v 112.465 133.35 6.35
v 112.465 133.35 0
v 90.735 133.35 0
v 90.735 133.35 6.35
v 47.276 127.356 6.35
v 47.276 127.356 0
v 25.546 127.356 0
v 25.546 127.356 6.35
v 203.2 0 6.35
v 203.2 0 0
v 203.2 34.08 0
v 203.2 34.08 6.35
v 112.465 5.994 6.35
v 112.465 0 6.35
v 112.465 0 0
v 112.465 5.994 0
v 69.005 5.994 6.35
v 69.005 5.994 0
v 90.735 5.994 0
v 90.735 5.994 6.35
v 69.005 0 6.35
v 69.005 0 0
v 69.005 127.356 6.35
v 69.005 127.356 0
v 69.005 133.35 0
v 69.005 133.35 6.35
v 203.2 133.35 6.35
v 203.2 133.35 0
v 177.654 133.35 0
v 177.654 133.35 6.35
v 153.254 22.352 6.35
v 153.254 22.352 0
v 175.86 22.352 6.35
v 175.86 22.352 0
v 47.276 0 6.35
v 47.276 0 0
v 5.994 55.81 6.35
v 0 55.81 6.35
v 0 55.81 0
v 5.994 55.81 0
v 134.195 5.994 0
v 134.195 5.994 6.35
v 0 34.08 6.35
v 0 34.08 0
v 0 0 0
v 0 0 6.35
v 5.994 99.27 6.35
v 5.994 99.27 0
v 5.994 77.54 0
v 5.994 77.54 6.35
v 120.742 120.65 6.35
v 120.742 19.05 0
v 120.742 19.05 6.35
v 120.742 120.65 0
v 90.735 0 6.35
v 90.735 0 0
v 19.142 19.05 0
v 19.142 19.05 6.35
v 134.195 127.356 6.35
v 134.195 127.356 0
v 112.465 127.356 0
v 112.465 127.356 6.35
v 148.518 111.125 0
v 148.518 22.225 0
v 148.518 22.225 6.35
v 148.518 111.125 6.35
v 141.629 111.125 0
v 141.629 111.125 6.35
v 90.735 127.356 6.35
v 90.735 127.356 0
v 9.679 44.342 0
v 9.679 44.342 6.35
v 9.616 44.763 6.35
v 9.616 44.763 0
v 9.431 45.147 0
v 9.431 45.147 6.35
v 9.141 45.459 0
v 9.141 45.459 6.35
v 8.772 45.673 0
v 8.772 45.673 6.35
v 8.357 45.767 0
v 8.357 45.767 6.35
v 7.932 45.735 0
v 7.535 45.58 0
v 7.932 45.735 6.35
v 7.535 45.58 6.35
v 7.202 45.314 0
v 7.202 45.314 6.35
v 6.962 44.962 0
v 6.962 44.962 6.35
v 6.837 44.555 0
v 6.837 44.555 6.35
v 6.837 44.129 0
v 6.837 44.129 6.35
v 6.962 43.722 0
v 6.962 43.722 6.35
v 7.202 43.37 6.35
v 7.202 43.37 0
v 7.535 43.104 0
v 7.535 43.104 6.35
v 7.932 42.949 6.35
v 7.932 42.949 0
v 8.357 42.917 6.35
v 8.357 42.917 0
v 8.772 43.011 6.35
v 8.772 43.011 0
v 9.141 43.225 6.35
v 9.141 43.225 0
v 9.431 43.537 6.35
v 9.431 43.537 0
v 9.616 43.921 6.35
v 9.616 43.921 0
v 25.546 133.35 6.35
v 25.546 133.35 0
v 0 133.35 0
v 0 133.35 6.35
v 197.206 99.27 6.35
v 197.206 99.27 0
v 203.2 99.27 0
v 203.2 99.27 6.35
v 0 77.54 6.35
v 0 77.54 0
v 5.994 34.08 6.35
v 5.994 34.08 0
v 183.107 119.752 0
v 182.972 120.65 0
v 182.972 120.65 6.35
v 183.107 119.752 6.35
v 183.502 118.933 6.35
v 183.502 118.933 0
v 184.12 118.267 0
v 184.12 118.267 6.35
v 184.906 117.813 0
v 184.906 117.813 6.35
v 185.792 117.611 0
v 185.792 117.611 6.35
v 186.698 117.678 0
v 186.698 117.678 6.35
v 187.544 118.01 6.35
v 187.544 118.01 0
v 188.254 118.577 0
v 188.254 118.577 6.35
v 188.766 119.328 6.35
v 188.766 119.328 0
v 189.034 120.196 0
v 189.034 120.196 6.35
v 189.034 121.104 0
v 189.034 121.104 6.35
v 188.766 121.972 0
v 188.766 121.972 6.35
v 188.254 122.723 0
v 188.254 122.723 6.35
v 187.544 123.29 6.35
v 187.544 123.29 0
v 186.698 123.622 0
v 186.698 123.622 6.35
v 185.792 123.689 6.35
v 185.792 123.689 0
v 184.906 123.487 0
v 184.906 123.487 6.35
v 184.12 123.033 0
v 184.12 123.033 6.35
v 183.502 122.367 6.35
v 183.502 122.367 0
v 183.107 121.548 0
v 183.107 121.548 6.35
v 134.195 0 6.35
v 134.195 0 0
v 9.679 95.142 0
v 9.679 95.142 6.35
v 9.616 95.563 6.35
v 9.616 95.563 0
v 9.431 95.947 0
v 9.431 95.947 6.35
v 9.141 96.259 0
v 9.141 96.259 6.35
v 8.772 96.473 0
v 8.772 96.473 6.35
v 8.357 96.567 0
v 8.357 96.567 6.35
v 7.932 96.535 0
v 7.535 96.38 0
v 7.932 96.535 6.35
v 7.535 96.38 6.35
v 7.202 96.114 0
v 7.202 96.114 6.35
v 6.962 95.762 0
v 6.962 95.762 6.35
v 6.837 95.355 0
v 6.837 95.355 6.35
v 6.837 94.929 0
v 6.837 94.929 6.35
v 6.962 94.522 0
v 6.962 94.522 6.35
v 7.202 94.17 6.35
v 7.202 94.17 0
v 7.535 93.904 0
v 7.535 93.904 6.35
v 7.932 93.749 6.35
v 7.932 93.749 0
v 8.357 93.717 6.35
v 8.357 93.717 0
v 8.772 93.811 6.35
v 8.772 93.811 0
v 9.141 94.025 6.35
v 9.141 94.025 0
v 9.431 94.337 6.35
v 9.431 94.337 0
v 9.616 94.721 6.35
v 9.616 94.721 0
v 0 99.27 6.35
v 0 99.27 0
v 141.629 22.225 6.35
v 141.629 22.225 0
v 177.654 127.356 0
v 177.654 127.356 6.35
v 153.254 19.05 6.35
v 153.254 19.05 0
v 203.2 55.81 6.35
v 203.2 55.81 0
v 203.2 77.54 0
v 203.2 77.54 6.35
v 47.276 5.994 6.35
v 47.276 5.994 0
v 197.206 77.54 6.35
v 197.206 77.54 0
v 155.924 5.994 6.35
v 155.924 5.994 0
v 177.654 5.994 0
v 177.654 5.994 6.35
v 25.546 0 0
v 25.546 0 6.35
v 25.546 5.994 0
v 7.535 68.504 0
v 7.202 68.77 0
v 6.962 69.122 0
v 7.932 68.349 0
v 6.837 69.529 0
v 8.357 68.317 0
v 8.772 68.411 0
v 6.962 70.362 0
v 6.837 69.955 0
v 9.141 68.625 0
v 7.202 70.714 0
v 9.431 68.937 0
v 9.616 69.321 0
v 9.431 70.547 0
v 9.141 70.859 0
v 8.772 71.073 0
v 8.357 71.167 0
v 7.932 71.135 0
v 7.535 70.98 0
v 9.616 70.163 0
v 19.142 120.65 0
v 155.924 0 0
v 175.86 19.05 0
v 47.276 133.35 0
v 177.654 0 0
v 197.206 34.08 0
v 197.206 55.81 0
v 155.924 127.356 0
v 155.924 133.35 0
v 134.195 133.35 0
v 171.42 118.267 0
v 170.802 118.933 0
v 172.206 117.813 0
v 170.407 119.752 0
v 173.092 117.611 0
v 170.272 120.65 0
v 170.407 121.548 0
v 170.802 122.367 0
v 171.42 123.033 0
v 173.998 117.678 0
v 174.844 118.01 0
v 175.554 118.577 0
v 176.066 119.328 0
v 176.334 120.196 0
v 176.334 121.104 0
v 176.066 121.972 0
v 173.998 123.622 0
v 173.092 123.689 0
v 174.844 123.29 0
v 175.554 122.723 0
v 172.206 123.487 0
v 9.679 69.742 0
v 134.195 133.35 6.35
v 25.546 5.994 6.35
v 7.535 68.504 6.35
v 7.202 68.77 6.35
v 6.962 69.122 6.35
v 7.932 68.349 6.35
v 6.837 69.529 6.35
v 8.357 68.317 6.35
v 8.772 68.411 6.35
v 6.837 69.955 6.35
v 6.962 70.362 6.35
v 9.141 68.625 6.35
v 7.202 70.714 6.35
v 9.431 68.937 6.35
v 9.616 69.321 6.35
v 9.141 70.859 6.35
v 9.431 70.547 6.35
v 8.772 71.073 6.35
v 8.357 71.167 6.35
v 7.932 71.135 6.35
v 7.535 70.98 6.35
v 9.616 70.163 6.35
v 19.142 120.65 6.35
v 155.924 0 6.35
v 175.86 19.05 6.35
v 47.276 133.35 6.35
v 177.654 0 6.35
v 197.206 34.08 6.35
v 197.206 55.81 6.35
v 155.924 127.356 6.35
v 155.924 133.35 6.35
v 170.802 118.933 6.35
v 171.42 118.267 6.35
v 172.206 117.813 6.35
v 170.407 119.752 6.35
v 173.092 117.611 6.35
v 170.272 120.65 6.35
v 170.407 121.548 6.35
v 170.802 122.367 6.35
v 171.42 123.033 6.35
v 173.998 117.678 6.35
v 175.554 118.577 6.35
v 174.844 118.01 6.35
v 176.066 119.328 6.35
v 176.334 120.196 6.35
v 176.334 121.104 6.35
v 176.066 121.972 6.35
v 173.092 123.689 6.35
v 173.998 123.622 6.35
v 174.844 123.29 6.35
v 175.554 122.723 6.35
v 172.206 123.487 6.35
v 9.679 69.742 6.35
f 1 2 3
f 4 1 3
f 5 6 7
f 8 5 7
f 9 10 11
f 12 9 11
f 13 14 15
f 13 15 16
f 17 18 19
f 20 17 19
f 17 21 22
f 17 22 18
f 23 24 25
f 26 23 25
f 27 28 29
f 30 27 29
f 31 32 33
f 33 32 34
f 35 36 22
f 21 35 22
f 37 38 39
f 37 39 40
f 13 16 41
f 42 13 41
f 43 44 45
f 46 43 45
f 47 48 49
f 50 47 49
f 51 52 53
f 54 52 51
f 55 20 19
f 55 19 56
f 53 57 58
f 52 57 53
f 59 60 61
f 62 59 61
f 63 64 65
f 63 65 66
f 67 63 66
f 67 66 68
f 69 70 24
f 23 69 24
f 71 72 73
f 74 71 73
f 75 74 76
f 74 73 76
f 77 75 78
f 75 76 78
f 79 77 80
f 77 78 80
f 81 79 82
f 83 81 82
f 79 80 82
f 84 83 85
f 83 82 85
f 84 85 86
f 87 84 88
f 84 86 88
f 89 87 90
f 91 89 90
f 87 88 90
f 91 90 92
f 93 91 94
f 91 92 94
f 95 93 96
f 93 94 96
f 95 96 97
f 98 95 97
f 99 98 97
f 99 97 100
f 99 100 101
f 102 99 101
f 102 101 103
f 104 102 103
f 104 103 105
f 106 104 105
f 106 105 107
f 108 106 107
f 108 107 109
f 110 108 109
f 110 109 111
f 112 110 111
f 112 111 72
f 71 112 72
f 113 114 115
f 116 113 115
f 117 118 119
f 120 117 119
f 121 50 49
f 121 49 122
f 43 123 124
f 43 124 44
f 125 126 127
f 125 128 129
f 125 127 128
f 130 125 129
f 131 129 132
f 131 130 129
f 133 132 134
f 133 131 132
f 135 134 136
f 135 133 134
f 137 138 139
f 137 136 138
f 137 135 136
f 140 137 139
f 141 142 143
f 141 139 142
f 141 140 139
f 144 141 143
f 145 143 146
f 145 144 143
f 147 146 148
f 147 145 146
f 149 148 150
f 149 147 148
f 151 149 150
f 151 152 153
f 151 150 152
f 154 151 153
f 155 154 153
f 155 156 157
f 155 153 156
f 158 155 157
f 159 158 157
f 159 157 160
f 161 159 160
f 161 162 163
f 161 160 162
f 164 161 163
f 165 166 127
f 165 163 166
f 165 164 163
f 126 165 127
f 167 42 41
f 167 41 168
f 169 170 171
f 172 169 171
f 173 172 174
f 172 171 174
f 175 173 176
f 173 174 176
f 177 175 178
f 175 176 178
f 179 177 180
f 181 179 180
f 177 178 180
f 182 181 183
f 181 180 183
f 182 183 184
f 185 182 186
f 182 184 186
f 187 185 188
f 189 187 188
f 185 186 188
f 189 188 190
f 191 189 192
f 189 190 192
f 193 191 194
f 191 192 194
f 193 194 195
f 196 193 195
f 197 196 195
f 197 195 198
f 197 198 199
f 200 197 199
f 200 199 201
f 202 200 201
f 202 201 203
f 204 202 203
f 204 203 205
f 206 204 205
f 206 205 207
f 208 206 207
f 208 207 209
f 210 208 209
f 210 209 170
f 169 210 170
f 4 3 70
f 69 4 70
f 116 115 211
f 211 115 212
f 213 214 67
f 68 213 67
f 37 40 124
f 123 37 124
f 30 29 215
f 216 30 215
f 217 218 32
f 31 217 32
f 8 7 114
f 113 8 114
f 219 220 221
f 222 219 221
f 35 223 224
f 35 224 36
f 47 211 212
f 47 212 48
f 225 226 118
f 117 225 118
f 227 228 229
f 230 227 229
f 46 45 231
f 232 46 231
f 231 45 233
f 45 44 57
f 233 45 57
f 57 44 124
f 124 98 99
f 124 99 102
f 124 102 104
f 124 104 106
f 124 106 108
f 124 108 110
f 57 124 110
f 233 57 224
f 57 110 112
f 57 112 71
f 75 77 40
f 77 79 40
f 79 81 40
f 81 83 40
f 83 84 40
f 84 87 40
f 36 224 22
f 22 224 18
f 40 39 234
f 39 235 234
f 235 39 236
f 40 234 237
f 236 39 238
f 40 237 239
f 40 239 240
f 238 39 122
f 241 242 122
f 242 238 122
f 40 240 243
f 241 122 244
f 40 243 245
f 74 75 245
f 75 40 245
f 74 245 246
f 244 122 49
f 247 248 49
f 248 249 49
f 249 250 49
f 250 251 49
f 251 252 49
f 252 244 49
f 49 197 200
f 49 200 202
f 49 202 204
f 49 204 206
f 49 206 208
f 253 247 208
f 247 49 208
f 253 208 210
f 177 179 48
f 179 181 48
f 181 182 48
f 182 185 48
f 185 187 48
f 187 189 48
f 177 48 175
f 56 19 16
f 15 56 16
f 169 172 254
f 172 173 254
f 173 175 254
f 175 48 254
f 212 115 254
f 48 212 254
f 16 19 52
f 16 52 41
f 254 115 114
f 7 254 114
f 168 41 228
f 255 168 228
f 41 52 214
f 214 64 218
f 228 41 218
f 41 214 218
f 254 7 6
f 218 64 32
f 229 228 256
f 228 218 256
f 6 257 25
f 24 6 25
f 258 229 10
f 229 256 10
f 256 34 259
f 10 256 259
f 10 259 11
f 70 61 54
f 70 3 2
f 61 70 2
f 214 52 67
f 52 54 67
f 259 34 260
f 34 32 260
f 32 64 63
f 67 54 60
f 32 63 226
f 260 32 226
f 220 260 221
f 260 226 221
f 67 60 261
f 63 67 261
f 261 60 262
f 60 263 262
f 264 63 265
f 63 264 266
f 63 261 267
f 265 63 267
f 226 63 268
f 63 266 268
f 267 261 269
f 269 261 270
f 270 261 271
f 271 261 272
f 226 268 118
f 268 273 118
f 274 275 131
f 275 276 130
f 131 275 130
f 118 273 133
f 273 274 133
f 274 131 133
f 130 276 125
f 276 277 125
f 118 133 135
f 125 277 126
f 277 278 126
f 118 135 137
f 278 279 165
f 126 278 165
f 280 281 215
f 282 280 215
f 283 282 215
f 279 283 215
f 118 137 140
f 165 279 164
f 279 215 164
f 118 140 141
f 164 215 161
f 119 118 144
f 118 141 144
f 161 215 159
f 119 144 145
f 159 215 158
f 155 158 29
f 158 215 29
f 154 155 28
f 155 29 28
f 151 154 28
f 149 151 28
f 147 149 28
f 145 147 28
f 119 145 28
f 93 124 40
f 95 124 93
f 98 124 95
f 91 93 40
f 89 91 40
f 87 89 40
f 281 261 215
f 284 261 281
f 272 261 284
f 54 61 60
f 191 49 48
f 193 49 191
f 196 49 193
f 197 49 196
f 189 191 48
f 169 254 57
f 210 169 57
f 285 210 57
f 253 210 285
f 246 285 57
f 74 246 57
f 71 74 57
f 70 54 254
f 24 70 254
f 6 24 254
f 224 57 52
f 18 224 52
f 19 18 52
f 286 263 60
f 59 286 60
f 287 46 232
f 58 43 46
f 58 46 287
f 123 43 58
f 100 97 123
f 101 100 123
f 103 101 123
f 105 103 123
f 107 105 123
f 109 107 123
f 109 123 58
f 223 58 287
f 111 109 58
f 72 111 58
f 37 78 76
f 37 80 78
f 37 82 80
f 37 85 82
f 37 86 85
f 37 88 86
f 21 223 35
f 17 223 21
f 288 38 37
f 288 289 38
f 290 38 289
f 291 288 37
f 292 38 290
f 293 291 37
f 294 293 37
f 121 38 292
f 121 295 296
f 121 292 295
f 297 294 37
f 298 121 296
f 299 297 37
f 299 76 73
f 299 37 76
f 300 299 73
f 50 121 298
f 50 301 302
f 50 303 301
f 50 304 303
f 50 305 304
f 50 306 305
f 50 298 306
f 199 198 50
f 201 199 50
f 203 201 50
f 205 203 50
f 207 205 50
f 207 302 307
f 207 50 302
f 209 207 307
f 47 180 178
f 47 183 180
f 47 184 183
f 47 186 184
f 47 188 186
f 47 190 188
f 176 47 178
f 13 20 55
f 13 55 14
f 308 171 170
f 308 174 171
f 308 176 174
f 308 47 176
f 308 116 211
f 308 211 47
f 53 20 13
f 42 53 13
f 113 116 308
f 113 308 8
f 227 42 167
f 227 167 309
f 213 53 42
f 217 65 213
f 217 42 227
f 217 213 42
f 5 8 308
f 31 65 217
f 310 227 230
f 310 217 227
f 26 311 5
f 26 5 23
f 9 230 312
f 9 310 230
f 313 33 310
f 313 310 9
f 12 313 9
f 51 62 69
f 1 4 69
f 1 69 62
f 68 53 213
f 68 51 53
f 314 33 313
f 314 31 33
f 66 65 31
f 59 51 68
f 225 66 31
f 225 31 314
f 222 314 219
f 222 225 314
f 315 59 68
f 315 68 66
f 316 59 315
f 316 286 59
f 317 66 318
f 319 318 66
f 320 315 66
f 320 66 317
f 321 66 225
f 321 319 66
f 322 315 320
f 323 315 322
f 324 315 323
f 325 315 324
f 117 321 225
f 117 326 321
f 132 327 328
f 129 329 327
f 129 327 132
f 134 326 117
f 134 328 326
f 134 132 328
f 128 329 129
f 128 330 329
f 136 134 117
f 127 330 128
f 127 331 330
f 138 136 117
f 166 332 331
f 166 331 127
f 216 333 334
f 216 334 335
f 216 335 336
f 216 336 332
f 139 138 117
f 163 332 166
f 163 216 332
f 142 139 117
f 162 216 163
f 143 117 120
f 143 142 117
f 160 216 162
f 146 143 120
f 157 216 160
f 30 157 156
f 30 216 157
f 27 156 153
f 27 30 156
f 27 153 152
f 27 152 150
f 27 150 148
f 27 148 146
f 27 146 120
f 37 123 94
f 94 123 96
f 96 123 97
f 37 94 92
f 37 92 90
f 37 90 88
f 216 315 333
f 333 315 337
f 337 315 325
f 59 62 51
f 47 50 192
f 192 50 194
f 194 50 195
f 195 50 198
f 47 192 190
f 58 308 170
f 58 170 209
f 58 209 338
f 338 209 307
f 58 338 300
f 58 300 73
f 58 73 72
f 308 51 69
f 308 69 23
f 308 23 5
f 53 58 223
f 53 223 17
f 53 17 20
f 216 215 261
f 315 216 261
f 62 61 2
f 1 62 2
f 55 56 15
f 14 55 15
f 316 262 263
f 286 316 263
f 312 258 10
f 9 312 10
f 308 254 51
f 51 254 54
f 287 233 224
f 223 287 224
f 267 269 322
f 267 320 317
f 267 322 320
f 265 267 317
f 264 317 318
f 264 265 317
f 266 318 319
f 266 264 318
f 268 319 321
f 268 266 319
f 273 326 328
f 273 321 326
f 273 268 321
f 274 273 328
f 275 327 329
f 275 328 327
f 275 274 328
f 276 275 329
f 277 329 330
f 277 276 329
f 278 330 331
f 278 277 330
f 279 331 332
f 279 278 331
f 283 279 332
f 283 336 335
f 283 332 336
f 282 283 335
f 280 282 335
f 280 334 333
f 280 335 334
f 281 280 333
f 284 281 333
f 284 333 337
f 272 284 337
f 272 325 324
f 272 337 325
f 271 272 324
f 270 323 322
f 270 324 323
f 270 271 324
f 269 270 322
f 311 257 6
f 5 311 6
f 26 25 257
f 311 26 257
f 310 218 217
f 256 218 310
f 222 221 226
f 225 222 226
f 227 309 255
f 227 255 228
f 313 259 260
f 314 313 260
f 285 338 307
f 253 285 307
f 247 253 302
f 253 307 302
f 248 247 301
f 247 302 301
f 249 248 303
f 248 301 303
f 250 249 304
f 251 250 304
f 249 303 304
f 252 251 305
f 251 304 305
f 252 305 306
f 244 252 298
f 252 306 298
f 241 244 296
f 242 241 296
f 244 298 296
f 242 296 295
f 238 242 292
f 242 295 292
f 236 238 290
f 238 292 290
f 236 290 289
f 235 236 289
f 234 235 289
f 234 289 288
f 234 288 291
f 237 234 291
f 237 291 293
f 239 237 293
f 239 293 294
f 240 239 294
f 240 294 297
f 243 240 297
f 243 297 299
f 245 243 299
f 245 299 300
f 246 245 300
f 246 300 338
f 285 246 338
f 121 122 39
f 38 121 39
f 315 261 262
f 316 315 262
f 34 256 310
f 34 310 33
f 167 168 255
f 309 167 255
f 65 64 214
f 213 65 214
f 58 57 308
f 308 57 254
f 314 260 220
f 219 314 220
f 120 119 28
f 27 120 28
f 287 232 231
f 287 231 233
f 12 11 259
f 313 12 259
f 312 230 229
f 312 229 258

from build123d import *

# Parameters (mm, degrees)
BOSS_EXTRUDE1_DEPTH     = 6.35
CUT_EXTRUDE1_DEPTH      = 244.131209432
CUT_EXTRUDE1_DEPTH_BACK = 244.131209432
SKETCH4_W               = 101.6
SKETCH4_H               = 101.6
SKETCH4_W_2             = 22.606
SKETCH4_H_2             = 3.302
SKETCH5_W               = 6.888524177
SKETCH5_H               = 88.9
CUT_EXTRUDE2_DEPTH      = 6.35
SKETCH6_R               = 1.429315601
CUT_EXTRUDE3_DEPTH      = 13.97


with BuildPart() as part:
    # Sketch3 → Boss-Extrude1 (new body)
    with BuildSketch(Plane.XY):
        Polygon((0, 77.53985), (0, 55.81015), (5.9944, 55.81015), (5.9944, 34.08045), (0, 34.08045), (0, 12.35075), (0, 0), (25.54605, 0), (25.54605, 5.9944), (47.27575, 5.9944), (47.27575, 0), (69.00545, 0), (69.00545, 5.9944), (90.73515, 5.9944), (90.73515, 0), (112.46485, 0), (112.46485, 5.9944), (134.19455, 5.9944), (134.19455, 0), (155.92425, 0), (155.92425, 5.9944), (177.65395, 5.9944), (177.65395, 0), (203.2, 0), (203.2, 34.08045), (197.2056, 34.08045), (197.2056, 55.81015), (203.2, 55.81015), (203.2, 77.53985), (197.2056, 77.53985), (197.2056, 99.26955), (203.2, 99.26955), (203.2, 120.99925), (203.2, 133.35), (177.65395, 133.35), (177.65395, 127.3556), (155.92425, 127.3556), (155.92425, 133.35), (134.19455, 133.35), (134.19455, 127.3556), (112.46485, 127.3556), (112.46485, 133.35), (90.73515, 133.35), (90.73515, 127.3556), (69.00545, 127.3556), (69.00545, 133.35), (47.27575, 133.35), (47.27575, 127.3556), (25.54605, 127.3556), (25.54605, 133.35), (0, 133.35), (0, 99.26955), (5.9944, 99.26955), (5.9944, 77.53985), align=None)
    extrude(amount=BOSS_EXTRUDE1_DEPTH)

    # Sketch4 → Cut-Extrude1 (cut, two sides: drawn at the far end of the back side and taken through both)
    with BuildSketch(Plane.XY.offset(6.35).offset(-CUT_EXTRUDE1_DEPTH_BACK)):
        with Locations((69.942028986, 69.85)):
            Rectangle(SKETCH4_W, SKETCH4_H)
        with BuildLine():
            ThreePointArc((189.068028986, 120.65), (186.020028986, 123.698), (182.972028986, 120.65))
            Line((182.972028986, 120.65), (189.068028986, 120.65))
        make_face()
        with BuildLine():
            Line((189.068028986, 120.65), (182.972028986, 120.65))
            ThreePointArc((182.972028986, 120.65), (186.020028986, 117.602), (189.068028986, 120.65))
        make_face()
        with BuildLine():
            ThreePointArc((176.368028986, 120.65), (173.320028986, 123.698), (170.272028986, 120.65))
            Line((170.272028986, 120.65), (176.368028986, 120.65))
        make_face()
        with BuildLine():
            Line((176.368028986, 120.65), (170.272028986, 120.65))
            ThreePointArc((170.272028986, 120.65), (173.320028986, 117.602), (176.368028986, 120.65))
        make_face()
        with Locations((164.557028986, 20.701)):
            Rectangle(SKETCH4_W_2, SKETCH4_H_2)
    extrude(amount=CUT_EXTRUDE1_DEPTH + CUT_EXTRUDE1_DEPTH_BACK, mode=Mode.SUBTRACT)

    # Sketch5 → Cut-Extrude2 (cut)
    with BuildSketch(Plane(origin=(0, 0, 0), x_dir=(-1, 0, 0), z_dir=(0, 0, -1))):
        with Locations((-145.073671488, 66.675)):
            Rectangle(SKETCH5_W, SKETCH5_H)
    extrude(amount=-CUT_EXTRUDE2_DEPTH, mode=Mode.SUBTRACT)

    # Sketch6 → Cut-Extrude3 (cut)
    with BuildSketch(Plane.XY.offset(6.35)):
        with Locations((8.25, 95.142010497)):
            Circle(SKETCH6_R)
        with Locations((8.25, 69.742010497)):
            Circle(SKETCH6_R)
        with Locations((8.25, 44.342010497)):
            Circle(SKETCH6_R)
    extrude(amount=-CUT_EXTRUDE3_DEPTH, mode=Mode.SUBTRACT)


solid = part.part
